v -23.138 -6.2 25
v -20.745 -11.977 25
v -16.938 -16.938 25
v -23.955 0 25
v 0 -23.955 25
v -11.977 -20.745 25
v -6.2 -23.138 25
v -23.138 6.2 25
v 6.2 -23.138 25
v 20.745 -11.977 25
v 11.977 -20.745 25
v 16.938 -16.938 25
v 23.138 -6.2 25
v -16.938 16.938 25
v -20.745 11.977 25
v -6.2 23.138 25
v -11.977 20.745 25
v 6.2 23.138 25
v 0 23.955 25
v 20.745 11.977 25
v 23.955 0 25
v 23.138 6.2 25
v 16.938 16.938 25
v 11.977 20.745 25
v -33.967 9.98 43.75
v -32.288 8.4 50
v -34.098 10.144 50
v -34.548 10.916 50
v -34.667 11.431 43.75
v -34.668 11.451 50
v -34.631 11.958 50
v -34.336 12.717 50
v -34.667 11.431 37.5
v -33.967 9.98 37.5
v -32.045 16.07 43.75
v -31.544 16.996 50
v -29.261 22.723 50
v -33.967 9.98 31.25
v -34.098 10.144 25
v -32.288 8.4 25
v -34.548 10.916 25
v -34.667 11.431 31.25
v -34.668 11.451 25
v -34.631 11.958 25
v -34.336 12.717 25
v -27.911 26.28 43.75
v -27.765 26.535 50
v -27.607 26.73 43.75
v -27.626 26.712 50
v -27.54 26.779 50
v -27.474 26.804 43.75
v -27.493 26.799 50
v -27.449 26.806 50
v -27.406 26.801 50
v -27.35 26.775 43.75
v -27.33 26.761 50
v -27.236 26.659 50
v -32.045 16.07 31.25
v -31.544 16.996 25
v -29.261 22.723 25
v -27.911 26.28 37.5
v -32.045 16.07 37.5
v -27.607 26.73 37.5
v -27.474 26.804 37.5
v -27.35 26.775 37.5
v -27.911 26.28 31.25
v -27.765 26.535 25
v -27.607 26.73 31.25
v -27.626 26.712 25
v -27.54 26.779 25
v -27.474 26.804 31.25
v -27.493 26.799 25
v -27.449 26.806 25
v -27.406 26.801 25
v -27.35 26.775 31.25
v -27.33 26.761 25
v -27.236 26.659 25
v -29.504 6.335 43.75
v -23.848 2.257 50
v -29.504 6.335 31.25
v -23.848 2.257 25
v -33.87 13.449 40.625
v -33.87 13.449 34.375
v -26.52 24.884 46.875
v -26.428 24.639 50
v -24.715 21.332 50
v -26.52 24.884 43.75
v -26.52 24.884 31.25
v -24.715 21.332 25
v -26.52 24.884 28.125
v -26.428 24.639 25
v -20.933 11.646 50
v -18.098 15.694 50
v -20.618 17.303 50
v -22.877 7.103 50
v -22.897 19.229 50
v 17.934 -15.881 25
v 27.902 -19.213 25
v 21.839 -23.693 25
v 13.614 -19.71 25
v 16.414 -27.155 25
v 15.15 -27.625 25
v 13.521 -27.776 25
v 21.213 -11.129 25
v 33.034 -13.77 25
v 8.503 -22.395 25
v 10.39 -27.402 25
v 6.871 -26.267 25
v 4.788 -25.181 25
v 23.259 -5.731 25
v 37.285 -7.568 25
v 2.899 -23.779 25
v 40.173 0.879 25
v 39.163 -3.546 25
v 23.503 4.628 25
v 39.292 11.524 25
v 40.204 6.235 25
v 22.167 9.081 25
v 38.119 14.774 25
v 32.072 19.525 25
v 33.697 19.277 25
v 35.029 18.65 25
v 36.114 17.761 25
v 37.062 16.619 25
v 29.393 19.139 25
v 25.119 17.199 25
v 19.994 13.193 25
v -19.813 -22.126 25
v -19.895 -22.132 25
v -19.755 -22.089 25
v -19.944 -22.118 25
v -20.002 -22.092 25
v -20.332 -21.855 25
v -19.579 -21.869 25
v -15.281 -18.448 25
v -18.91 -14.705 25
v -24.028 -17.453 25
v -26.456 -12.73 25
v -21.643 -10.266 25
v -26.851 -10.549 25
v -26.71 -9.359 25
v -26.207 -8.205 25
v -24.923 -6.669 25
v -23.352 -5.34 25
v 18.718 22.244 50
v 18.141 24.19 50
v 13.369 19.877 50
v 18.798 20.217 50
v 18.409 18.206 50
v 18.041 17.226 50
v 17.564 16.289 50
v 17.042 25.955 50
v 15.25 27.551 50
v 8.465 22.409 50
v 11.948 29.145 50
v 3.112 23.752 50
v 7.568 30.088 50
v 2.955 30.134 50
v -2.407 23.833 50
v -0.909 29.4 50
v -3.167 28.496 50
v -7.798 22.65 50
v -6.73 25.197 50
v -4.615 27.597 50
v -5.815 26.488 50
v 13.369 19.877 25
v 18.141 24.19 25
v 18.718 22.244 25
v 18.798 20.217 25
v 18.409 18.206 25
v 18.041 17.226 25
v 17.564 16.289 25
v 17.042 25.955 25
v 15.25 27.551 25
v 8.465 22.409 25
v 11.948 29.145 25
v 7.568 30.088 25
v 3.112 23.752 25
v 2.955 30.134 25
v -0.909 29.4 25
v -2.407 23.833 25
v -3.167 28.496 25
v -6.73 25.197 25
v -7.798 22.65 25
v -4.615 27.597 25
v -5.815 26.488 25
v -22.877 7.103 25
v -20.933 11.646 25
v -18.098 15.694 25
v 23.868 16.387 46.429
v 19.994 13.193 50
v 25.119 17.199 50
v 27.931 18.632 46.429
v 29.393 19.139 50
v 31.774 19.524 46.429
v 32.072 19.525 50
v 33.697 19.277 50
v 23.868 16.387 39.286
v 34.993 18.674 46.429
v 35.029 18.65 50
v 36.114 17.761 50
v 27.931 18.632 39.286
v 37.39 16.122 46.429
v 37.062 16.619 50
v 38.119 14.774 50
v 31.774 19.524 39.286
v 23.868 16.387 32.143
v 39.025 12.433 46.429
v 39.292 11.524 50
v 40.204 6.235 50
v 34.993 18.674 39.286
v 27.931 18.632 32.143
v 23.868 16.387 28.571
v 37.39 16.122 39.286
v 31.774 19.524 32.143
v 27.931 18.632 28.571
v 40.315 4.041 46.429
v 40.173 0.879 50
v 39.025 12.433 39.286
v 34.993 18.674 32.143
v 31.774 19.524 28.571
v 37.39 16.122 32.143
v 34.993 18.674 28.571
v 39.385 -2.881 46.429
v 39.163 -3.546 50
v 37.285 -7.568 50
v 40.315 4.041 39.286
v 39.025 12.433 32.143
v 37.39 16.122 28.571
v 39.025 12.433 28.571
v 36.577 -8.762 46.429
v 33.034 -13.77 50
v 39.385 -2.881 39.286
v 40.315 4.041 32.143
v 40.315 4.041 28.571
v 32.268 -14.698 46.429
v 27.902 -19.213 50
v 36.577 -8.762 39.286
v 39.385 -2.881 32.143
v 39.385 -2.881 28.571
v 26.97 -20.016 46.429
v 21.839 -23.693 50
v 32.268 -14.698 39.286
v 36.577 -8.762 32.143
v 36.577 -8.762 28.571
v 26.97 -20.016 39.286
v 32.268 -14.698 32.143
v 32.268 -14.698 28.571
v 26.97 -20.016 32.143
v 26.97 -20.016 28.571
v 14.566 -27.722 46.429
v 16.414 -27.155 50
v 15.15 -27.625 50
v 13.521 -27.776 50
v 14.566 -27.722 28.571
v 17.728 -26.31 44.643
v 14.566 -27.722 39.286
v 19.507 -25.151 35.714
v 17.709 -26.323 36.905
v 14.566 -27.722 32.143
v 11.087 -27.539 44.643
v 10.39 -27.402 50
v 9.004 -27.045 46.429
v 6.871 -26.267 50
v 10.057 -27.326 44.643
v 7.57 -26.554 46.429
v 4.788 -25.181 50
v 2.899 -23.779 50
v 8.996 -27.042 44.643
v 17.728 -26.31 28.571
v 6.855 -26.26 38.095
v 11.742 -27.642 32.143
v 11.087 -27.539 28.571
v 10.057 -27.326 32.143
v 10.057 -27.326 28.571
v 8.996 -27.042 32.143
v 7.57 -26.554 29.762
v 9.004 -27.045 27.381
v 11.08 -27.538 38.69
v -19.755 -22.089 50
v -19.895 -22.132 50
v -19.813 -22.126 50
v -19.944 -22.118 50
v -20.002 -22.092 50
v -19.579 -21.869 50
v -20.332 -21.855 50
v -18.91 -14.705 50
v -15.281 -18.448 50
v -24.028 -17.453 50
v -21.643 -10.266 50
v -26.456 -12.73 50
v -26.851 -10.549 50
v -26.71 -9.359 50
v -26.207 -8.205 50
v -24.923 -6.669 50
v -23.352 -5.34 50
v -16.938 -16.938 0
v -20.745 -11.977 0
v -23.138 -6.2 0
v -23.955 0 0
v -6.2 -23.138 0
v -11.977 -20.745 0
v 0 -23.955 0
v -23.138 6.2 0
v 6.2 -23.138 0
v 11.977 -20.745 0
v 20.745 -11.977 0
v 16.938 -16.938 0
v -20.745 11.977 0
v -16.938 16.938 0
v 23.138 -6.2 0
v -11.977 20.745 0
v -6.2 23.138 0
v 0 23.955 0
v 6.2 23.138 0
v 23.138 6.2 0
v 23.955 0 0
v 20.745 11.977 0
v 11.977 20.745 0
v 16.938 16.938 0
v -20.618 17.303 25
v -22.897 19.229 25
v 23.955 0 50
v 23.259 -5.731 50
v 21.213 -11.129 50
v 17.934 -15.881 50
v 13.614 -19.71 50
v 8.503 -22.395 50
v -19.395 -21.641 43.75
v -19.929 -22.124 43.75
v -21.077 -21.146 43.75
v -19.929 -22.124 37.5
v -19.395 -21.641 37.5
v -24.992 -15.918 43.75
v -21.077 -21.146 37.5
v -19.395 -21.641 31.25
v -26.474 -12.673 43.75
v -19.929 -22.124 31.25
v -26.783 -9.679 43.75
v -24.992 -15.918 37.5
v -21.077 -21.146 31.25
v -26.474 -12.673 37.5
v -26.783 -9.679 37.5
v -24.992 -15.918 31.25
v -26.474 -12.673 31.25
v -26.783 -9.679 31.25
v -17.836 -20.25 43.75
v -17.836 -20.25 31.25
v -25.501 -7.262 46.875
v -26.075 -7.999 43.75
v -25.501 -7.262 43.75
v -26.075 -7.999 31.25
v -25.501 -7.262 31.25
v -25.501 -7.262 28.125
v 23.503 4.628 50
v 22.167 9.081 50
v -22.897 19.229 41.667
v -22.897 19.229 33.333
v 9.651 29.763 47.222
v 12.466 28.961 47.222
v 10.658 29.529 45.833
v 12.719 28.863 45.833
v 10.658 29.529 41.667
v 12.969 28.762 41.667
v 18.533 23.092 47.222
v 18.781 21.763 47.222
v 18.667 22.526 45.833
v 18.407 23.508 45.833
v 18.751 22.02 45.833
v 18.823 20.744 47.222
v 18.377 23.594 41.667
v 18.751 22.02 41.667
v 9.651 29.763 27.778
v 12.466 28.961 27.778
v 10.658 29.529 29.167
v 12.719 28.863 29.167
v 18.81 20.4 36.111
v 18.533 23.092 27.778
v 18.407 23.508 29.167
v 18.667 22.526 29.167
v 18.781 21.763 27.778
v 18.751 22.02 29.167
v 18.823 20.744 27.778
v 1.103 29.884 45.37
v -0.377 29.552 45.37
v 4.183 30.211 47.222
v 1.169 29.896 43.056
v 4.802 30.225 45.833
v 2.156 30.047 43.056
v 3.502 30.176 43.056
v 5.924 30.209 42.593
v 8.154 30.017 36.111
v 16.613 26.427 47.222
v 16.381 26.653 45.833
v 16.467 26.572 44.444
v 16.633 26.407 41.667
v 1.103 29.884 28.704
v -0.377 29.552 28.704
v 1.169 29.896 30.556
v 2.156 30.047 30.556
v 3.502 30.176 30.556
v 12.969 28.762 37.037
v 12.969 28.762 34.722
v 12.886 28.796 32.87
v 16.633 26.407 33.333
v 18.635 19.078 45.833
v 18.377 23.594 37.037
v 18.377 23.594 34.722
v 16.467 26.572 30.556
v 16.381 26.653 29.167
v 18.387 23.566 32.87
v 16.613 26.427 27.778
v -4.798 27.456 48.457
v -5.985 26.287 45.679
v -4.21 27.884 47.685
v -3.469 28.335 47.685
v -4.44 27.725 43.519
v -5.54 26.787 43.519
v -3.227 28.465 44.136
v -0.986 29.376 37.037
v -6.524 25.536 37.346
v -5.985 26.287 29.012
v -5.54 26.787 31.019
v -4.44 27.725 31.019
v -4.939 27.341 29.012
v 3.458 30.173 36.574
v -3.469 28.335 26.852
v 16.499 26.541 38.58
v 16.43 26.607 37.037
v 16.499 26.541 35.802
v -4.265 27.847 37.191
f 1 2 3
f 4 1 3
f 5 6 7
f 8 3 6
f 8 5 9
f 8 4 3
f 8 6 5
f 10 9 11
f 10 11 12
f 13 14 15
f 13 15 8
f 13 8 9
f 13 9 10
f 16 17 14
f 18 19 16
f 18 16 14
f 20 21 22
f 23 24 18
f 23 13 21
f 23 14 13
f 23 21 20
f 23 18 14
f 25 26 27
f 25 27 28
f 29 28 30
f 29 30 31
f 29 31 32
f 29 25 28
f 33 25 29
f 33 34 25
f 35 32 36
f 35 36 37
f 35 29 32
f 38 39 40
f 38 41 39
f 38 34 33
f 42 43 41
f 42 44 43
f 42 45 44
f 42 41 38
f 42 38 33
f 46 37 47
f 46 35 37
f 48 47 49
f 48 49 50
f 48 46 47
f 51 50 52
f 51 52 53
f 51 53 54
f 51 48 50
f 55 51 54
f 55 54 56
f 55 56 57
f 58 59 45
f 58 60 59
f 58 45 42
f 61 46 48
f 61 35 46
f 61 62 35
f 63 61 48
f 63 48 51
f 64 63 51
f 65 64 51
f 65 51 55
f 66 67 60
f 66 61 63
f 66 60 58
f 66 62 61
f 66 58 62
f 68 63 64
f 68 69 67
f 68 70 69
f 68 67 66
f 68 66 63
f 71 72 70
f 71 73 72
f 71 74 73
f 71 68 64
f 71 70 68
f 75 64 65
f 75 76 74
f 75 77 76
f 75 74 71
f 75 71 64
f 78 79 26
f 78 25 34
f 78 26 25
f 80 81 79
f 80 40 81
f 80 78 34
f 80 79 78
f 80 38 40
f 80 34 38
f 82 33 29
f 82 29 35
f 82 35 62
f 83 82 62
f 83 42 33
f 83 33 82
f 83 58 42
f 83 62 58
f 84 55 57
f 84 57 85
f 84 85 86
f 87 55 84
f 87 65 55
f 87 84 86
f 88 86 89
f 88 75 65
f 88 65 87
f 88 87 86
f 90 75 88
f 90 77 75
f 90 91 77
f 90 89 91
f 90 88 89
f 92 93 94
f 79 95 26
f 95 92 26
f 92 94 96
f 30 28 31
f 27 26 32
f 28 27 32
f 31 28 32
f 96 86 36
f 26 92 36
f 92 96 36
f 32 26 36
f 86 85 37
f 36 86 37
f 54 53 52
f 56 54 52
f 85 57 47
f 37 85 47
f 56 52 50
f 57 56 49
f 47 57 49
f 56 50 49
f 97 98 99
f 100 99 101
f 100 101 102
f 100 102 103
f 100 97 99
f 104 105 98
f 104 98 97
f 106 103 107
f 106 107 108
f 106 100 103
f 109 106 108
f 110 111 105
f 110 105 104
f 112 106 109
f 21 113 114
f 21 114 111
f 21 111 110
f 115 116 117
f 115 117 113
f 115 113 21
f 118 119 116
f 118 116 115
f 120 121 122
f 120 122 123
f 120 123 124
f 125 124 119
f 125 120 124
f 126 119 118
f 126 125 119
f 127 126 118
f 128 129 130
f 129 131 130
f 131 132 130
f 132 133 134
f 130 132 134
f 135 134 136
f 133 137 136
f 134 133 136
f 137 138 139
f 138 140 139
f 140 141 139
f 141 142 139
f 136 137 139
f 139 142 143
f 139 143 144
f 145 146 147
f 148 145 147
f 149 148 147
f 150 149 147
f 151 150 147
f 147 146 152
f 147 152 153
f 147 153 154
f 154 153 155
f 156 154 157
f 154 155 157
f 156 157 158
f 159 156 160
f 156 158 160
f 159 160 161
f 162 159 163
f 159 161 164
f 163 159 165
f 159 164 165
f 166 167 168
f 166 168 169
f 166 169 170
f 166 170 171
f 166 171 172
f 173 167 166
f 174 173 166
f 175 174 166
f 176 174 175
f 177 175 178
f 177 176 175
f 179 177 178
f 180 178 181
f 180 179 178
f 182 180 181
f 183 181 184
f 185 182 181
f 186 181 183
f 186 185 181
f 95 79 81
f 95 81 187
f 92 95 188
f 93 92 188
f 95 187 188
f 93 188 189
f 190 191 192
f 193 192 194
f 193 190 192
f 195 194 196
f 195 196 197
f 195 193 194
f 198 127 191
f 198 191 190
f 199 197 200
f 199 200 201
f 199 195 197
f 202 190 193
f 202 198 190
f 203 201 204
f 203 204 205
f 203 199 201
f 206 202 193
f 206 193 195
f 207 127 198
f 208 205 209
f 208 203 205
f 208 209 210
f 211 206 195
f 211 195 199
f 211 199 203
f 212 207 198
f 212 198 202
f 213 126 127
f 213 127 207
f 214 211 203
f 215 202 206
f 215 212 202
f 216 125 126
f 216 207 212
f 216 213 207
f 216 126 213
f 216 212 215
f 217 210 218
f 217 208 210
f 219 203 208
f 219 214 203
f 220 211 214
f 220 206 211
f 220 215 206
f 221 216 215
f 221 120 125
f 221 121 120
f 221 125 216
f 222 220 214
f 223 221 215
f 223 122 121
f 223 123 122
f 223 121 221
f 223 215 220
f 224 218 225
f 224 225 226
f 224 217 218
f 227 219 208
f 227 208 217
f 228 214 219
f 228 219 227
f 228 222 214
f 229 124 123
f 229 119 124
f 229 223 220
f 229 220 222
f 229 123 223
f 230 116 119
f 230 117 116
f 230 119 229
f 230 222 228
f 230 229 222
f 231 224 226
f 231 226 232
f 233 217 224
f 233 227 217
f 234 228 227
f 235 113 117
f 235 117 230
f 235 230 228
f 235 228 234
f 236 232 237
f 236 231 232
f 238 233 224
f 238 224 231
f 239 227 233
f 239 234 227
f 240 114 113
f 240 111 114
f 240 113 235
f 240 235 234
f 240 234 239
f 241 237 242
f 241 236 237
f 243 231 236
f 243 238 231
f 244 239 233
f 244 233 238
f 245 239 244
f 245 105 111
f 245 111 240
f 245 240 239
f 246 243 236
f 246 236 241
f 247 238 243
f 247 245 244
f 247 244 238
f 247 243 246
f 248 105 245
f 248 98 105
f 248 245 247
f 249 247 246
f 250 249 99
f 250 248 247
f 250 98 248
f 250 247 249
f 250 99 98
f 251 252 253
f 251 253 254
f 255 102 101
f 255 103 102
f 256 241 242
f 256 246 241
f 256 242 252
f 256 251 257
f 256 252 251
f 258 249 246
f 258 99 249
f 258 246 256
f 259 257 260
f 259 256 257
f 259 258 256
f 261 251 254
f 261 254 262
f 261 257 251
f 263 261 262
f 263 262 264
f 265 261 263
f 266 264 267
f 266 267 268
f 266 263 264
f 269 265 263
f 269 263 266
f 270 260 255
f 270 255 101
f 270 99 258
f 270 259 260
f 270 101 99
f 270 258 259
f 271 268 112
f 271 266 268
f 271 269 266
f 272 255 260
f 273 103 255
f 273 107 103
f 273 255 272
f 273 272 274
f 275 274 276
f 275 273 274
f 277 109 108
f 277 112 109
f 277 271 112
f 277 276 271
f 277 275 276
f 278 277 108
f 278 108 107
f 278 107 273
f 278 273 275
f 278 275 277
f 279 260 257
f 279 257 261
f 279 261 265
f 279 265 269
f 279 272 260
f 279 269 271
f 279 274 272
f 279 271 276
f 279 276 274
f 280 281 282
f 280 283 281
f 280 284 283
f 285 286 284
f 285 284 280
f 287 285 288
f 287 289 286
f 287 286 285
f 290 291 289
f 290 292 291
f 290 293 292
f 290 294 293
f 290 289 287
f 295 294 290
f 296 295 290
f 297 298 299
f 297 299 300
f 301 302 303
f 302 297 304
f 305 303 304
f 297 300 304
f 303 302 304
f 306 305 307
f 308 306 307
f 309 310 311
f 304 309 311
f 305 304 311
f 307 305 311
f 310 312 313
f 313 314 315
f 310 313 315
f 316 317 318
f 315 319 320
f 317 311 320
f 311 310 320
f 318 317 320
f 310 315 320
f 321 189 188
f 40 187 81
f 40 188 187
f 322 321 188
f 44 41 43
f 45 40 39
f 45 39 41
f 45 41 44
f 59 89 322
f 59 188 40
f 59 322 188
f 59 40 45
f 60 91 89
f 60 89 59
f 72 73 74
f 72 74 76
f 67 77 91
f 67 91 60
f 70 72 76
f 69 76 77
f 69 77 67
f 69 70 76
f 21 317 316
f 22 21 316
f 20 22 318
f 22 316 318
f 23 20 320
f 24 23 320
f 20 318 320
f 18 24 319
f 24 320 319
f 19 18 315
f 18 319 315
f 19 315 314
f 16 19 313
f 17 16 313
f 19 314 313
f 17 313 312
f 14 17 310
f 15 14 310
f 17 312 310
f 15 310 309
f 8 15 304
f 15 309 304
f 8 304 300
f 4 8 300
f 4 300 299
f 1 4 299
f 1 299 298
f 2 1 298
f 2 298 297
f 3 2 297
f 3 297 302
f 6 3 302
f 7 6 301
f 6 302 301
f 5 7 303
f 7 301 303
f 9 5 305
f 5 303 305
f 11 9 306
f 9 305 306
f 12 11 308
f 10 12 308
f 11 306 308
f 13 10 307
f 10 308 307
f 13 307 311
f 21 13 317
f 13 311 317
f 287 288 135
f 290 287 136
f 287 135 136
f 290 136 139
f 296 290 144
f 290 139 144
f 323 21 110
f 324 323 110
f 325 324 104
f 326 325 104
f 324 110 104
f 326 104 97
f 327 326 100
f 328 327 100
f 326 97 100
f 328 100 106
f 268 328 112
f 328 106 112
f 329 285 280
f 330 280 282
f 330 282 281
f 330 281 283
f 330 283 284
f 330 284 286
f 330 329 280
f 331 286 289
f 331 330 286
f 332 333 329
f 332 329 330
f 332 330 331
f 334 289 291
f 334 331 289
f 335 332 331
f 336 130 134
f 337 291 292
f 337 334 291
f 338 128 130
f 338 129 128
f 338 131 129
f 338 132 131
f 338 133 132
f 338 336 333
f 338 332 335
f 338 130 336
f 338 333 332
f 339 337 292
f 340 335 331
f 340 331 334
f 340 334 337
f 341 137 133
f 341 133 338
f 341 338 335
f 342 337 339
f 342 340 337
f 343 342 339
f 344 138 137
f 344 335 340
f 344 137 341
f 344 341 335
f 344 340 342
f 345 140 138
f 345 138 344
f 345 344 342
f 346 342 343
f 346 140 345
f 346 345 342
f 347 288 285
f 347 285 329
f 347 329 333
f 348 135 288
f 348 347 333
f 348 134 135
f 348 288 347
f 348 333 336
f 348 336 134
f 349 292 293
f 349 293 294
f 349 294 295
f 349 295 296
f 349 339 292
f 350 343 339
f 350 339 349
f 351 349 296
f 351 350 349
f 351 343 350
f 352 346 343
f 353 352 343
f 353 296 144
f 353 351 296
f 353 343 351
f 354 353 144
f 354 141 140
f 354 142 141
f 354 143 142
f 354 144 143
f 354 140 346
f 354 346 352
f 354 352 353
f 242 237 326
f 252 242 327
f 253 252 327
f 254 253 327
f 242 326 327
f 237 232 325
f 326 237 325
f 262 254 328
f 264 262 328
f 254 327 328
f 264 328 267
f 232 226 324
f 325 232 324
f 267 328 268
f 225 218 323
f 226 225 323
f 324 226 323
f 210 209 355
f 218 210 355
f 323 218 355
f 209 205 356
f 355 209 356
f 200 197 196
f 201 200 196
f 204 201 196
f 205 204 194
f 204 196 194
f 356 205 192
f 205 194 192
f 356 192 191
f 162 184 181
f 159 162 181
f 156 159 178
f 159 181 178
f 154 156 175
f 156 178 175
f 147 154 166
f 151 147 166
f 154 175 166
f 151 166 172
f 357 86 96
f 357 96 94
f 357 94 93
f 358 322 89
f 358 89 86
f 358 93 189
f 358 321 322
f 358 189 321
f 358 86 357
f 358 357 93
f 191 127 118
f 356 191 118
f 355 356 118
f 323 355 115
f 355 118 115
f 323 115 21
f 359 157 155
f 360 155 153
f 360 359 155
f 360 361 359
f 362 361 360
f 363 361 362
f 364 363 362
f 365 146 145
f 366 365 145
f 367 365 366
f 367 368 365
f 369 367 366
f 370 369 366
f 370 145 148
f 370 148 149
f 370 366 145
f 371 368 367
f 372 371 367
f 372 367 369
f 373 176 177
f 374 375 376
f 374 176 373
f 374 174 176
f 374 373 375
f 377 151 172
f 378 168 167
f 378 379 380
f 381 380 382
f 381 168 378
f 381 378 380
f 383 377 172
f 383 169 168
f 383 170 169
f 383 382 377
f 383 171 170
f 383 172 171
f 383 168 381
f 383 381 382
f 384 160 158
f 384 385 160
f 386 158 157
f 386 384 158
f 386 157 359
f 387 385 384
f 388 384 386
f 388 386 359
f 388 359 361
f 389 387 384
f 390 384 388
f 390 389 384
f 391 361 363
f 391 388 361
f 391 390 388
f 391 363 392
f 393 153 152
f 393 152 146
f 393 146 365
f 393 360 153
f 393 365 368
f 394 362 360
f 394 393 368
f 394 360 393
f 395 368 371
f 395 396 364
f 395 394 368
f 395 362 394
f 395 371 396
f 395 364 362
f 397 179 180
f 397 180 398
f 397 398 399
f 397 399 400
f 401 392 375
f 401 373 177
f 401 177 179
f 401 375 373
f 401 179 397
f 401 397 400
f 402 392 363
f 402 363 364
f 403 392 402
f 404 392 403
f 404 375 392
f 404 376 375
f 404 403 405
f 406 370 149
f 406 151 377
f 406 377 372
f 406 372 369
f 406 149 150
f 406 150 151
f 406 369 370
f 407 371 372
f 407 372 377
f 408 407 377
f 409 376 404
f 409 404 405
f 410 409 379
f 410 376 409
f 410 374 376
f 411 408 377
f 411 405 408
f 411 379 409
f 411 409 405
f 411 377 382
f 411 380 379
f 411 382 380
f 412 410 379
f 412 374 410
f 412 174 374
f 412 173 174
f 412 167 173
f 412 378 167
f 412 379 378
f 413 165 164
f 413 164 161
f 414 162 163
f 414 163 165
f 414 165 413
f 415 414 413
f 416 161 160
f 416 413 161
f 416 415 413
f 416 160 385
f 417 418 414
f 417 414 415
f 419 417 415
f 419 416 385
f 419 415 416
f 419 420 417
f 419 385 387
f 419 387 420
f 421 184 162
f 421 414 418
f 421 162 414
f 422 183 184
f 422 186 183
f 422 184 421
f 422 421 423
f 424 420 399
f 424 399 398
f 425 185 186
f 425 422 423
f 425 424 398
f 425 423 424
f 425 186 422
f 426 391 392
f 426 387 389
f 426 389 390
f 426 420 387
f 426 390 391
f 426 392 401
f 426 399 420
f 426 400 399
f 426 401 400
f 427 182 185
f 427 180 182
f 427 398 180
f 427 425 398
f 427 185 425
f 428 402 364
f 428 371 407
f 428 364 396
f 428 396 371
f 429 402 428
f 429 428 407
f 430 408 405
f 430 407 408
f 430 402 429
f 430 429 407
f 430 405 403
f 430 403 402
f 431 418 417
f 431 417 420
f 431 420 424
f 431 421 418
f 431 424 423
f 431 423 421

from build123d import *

# Parameters (mm, degrees)
F0_R     = 23.9546443397
F1_DEPTH = 25
F3_DEPTH = 25


with BuildPart() as f1:
    # F0 (on Top) → F1 (new body)
    with BuildSketch(Plane.XY):
        Circle(F0_R)
    extrude(amount=F1_DEPTH)


with BuildPart() as f3:
    # F2 (on face) → F3 (new body)
    with BuildSketch(Plane.XY.offset(25)):
        with BuildLine():
            add(Edge.make_bspline(
                [(-24.7150976211, 21.3320404291), (-23.2002903756, 19.186358509), (-20.6654275959, 17.0985687847), (-18.0975842985, 15.6940252326)],
                knots=[0, 0, 0, 0, 0.0212956958, 0.0212956958, 0.0212956958, 0.0212956958], degree=3))
            add(Edge.make_bspline(
                [(-23.8481216764, 2.2565633053), (-27.4560942193, 5.1533829377), (-37.6616802367, 10.9856760089), (-30.9990816465, 14.9718419563), (-27.2416588005, 31.1404224602), (-26.7158251233, 24.1660147459), (-24.7150976211, 21.3320404291)],
                knots=[0.8728036995, 0.8728036995, 0.8728036995, 0.8728036995, 0.9051808039, 0.9331614819, 0.9718730655, 1, 1, 1, 1], degree=3))
            ThreePointArc((-23.8481216764, 2.2565633053), (-22.0227588688, 9.4245995803), (-18.0975842985, 15.6940252326))
        make_face()
    extrude(amount=F3_DEPTH)


with BuildPart() as f3b:
    # F2 (on face) → F3, piece 2 (new body)
    with BuildSketch(Plane.XY.offset(25)):
        with BuildLine():
            add(Edge.make_bspline(
                [(-7.798120177, 22.6498191416), (-7.3357771288, 24.1640022303), (-3.8961489999, 31.7139758191), (19.1628892215, 31.0167173164), (19.4173730169, 19.4670823497), (17.5636049801, 16.2894065437)],
                knots=[0.0736423478, 0.0736423478, 0.0736423478, 0.0736423478, 0.0864536893, 0.1399292421, 0.1703739198, 0.1703739198, 0.1703739198, 0.1703739198], degree=3))
            ThreePointArc((-7.798120177, 22.6498191416), (5.8270820712, 23.2351049057), (17.5636049801, 16.2894065437))
        make_face()
    extrude(amount=F3_DEPTH)


with BuildPart() as f3c:
    # F2 (on face) → F3, piece 3 (new body)
    with BuildSketch(Plane.XY.offset(25)):
        with BuildLine():
            ThreePointArc((-15.2805750437, -18.4480083418), (-20.3976980009, -12.5602110535), (-23.3517529855, -5.3404698245))
            add(Edge.make_bspline(
                [(-15.2805750437, -18.4480083418), (-17.2835096748, -19.7258473209), (-19.7184054128, -21.7136067449), (-19.8127175625, -23.0306574397), (-30.2600566586, -10.9709624007), (-24.8443676836, -6.5218797636), (-23.3517529855, -5.3404698245)],
                knots=[0.7503882685, 0.7503882685, 0.7503882685, 0.7503882685, 0.7685108982, 0.7778578374, 0.8205387441, 0.8384697352, 0.8384697352, 0.8384697352, 0.8384697352], degree=3))
        make_face()
    extrude(amount=F3_DEPTH)


with BuildPart() as f3d:
    # F2 (on face) → F3, piece 4 (new body)
    with BuildSketch(Plane.XY.offset(25)):
        with BuildLine():
            add(Edge.make_bspline(
                [(19.9944816312, 13.1926377098), (24.3380571596, 17.4099341736), (36.9154241585, 24.2242234648), (41.826872761, 2.8912504159), (37.7503183518, -8.245948549), (27.9109539258, -20.4495389333), (18.0849304531, -25.7934387672), (14.8437220967, -28.7013705154), (6.3842665907, -26.8969779377), (2.8987011595, -23.7786146996)],
                knots=[0.4163295284, 0.4163295284, 0.4163295284, 0.4163295284, 0.4537574098, 0.499996756, 0.5404228804, 0.5850869705, 0.622204964, 0.6447753293, 0.6846222223, 0.6846222223, 0.6846222223, 0.6846222223], degree=3))
            ThreePointArc((19.9944816312, 13.1926377098), (22.9432526212, 6.887099869), (23.9546443397, 0))
            ThreePointArc((23.9546443397, 0), (17.9340784648, -15.8806112937), (2.8987011595, -23.7786146996))
        make_face()
    extrude(amount=F3_DEPTH)


solid = Compound([f1.part, f3.part, f3b.part, f3c.part, f3d.part])
